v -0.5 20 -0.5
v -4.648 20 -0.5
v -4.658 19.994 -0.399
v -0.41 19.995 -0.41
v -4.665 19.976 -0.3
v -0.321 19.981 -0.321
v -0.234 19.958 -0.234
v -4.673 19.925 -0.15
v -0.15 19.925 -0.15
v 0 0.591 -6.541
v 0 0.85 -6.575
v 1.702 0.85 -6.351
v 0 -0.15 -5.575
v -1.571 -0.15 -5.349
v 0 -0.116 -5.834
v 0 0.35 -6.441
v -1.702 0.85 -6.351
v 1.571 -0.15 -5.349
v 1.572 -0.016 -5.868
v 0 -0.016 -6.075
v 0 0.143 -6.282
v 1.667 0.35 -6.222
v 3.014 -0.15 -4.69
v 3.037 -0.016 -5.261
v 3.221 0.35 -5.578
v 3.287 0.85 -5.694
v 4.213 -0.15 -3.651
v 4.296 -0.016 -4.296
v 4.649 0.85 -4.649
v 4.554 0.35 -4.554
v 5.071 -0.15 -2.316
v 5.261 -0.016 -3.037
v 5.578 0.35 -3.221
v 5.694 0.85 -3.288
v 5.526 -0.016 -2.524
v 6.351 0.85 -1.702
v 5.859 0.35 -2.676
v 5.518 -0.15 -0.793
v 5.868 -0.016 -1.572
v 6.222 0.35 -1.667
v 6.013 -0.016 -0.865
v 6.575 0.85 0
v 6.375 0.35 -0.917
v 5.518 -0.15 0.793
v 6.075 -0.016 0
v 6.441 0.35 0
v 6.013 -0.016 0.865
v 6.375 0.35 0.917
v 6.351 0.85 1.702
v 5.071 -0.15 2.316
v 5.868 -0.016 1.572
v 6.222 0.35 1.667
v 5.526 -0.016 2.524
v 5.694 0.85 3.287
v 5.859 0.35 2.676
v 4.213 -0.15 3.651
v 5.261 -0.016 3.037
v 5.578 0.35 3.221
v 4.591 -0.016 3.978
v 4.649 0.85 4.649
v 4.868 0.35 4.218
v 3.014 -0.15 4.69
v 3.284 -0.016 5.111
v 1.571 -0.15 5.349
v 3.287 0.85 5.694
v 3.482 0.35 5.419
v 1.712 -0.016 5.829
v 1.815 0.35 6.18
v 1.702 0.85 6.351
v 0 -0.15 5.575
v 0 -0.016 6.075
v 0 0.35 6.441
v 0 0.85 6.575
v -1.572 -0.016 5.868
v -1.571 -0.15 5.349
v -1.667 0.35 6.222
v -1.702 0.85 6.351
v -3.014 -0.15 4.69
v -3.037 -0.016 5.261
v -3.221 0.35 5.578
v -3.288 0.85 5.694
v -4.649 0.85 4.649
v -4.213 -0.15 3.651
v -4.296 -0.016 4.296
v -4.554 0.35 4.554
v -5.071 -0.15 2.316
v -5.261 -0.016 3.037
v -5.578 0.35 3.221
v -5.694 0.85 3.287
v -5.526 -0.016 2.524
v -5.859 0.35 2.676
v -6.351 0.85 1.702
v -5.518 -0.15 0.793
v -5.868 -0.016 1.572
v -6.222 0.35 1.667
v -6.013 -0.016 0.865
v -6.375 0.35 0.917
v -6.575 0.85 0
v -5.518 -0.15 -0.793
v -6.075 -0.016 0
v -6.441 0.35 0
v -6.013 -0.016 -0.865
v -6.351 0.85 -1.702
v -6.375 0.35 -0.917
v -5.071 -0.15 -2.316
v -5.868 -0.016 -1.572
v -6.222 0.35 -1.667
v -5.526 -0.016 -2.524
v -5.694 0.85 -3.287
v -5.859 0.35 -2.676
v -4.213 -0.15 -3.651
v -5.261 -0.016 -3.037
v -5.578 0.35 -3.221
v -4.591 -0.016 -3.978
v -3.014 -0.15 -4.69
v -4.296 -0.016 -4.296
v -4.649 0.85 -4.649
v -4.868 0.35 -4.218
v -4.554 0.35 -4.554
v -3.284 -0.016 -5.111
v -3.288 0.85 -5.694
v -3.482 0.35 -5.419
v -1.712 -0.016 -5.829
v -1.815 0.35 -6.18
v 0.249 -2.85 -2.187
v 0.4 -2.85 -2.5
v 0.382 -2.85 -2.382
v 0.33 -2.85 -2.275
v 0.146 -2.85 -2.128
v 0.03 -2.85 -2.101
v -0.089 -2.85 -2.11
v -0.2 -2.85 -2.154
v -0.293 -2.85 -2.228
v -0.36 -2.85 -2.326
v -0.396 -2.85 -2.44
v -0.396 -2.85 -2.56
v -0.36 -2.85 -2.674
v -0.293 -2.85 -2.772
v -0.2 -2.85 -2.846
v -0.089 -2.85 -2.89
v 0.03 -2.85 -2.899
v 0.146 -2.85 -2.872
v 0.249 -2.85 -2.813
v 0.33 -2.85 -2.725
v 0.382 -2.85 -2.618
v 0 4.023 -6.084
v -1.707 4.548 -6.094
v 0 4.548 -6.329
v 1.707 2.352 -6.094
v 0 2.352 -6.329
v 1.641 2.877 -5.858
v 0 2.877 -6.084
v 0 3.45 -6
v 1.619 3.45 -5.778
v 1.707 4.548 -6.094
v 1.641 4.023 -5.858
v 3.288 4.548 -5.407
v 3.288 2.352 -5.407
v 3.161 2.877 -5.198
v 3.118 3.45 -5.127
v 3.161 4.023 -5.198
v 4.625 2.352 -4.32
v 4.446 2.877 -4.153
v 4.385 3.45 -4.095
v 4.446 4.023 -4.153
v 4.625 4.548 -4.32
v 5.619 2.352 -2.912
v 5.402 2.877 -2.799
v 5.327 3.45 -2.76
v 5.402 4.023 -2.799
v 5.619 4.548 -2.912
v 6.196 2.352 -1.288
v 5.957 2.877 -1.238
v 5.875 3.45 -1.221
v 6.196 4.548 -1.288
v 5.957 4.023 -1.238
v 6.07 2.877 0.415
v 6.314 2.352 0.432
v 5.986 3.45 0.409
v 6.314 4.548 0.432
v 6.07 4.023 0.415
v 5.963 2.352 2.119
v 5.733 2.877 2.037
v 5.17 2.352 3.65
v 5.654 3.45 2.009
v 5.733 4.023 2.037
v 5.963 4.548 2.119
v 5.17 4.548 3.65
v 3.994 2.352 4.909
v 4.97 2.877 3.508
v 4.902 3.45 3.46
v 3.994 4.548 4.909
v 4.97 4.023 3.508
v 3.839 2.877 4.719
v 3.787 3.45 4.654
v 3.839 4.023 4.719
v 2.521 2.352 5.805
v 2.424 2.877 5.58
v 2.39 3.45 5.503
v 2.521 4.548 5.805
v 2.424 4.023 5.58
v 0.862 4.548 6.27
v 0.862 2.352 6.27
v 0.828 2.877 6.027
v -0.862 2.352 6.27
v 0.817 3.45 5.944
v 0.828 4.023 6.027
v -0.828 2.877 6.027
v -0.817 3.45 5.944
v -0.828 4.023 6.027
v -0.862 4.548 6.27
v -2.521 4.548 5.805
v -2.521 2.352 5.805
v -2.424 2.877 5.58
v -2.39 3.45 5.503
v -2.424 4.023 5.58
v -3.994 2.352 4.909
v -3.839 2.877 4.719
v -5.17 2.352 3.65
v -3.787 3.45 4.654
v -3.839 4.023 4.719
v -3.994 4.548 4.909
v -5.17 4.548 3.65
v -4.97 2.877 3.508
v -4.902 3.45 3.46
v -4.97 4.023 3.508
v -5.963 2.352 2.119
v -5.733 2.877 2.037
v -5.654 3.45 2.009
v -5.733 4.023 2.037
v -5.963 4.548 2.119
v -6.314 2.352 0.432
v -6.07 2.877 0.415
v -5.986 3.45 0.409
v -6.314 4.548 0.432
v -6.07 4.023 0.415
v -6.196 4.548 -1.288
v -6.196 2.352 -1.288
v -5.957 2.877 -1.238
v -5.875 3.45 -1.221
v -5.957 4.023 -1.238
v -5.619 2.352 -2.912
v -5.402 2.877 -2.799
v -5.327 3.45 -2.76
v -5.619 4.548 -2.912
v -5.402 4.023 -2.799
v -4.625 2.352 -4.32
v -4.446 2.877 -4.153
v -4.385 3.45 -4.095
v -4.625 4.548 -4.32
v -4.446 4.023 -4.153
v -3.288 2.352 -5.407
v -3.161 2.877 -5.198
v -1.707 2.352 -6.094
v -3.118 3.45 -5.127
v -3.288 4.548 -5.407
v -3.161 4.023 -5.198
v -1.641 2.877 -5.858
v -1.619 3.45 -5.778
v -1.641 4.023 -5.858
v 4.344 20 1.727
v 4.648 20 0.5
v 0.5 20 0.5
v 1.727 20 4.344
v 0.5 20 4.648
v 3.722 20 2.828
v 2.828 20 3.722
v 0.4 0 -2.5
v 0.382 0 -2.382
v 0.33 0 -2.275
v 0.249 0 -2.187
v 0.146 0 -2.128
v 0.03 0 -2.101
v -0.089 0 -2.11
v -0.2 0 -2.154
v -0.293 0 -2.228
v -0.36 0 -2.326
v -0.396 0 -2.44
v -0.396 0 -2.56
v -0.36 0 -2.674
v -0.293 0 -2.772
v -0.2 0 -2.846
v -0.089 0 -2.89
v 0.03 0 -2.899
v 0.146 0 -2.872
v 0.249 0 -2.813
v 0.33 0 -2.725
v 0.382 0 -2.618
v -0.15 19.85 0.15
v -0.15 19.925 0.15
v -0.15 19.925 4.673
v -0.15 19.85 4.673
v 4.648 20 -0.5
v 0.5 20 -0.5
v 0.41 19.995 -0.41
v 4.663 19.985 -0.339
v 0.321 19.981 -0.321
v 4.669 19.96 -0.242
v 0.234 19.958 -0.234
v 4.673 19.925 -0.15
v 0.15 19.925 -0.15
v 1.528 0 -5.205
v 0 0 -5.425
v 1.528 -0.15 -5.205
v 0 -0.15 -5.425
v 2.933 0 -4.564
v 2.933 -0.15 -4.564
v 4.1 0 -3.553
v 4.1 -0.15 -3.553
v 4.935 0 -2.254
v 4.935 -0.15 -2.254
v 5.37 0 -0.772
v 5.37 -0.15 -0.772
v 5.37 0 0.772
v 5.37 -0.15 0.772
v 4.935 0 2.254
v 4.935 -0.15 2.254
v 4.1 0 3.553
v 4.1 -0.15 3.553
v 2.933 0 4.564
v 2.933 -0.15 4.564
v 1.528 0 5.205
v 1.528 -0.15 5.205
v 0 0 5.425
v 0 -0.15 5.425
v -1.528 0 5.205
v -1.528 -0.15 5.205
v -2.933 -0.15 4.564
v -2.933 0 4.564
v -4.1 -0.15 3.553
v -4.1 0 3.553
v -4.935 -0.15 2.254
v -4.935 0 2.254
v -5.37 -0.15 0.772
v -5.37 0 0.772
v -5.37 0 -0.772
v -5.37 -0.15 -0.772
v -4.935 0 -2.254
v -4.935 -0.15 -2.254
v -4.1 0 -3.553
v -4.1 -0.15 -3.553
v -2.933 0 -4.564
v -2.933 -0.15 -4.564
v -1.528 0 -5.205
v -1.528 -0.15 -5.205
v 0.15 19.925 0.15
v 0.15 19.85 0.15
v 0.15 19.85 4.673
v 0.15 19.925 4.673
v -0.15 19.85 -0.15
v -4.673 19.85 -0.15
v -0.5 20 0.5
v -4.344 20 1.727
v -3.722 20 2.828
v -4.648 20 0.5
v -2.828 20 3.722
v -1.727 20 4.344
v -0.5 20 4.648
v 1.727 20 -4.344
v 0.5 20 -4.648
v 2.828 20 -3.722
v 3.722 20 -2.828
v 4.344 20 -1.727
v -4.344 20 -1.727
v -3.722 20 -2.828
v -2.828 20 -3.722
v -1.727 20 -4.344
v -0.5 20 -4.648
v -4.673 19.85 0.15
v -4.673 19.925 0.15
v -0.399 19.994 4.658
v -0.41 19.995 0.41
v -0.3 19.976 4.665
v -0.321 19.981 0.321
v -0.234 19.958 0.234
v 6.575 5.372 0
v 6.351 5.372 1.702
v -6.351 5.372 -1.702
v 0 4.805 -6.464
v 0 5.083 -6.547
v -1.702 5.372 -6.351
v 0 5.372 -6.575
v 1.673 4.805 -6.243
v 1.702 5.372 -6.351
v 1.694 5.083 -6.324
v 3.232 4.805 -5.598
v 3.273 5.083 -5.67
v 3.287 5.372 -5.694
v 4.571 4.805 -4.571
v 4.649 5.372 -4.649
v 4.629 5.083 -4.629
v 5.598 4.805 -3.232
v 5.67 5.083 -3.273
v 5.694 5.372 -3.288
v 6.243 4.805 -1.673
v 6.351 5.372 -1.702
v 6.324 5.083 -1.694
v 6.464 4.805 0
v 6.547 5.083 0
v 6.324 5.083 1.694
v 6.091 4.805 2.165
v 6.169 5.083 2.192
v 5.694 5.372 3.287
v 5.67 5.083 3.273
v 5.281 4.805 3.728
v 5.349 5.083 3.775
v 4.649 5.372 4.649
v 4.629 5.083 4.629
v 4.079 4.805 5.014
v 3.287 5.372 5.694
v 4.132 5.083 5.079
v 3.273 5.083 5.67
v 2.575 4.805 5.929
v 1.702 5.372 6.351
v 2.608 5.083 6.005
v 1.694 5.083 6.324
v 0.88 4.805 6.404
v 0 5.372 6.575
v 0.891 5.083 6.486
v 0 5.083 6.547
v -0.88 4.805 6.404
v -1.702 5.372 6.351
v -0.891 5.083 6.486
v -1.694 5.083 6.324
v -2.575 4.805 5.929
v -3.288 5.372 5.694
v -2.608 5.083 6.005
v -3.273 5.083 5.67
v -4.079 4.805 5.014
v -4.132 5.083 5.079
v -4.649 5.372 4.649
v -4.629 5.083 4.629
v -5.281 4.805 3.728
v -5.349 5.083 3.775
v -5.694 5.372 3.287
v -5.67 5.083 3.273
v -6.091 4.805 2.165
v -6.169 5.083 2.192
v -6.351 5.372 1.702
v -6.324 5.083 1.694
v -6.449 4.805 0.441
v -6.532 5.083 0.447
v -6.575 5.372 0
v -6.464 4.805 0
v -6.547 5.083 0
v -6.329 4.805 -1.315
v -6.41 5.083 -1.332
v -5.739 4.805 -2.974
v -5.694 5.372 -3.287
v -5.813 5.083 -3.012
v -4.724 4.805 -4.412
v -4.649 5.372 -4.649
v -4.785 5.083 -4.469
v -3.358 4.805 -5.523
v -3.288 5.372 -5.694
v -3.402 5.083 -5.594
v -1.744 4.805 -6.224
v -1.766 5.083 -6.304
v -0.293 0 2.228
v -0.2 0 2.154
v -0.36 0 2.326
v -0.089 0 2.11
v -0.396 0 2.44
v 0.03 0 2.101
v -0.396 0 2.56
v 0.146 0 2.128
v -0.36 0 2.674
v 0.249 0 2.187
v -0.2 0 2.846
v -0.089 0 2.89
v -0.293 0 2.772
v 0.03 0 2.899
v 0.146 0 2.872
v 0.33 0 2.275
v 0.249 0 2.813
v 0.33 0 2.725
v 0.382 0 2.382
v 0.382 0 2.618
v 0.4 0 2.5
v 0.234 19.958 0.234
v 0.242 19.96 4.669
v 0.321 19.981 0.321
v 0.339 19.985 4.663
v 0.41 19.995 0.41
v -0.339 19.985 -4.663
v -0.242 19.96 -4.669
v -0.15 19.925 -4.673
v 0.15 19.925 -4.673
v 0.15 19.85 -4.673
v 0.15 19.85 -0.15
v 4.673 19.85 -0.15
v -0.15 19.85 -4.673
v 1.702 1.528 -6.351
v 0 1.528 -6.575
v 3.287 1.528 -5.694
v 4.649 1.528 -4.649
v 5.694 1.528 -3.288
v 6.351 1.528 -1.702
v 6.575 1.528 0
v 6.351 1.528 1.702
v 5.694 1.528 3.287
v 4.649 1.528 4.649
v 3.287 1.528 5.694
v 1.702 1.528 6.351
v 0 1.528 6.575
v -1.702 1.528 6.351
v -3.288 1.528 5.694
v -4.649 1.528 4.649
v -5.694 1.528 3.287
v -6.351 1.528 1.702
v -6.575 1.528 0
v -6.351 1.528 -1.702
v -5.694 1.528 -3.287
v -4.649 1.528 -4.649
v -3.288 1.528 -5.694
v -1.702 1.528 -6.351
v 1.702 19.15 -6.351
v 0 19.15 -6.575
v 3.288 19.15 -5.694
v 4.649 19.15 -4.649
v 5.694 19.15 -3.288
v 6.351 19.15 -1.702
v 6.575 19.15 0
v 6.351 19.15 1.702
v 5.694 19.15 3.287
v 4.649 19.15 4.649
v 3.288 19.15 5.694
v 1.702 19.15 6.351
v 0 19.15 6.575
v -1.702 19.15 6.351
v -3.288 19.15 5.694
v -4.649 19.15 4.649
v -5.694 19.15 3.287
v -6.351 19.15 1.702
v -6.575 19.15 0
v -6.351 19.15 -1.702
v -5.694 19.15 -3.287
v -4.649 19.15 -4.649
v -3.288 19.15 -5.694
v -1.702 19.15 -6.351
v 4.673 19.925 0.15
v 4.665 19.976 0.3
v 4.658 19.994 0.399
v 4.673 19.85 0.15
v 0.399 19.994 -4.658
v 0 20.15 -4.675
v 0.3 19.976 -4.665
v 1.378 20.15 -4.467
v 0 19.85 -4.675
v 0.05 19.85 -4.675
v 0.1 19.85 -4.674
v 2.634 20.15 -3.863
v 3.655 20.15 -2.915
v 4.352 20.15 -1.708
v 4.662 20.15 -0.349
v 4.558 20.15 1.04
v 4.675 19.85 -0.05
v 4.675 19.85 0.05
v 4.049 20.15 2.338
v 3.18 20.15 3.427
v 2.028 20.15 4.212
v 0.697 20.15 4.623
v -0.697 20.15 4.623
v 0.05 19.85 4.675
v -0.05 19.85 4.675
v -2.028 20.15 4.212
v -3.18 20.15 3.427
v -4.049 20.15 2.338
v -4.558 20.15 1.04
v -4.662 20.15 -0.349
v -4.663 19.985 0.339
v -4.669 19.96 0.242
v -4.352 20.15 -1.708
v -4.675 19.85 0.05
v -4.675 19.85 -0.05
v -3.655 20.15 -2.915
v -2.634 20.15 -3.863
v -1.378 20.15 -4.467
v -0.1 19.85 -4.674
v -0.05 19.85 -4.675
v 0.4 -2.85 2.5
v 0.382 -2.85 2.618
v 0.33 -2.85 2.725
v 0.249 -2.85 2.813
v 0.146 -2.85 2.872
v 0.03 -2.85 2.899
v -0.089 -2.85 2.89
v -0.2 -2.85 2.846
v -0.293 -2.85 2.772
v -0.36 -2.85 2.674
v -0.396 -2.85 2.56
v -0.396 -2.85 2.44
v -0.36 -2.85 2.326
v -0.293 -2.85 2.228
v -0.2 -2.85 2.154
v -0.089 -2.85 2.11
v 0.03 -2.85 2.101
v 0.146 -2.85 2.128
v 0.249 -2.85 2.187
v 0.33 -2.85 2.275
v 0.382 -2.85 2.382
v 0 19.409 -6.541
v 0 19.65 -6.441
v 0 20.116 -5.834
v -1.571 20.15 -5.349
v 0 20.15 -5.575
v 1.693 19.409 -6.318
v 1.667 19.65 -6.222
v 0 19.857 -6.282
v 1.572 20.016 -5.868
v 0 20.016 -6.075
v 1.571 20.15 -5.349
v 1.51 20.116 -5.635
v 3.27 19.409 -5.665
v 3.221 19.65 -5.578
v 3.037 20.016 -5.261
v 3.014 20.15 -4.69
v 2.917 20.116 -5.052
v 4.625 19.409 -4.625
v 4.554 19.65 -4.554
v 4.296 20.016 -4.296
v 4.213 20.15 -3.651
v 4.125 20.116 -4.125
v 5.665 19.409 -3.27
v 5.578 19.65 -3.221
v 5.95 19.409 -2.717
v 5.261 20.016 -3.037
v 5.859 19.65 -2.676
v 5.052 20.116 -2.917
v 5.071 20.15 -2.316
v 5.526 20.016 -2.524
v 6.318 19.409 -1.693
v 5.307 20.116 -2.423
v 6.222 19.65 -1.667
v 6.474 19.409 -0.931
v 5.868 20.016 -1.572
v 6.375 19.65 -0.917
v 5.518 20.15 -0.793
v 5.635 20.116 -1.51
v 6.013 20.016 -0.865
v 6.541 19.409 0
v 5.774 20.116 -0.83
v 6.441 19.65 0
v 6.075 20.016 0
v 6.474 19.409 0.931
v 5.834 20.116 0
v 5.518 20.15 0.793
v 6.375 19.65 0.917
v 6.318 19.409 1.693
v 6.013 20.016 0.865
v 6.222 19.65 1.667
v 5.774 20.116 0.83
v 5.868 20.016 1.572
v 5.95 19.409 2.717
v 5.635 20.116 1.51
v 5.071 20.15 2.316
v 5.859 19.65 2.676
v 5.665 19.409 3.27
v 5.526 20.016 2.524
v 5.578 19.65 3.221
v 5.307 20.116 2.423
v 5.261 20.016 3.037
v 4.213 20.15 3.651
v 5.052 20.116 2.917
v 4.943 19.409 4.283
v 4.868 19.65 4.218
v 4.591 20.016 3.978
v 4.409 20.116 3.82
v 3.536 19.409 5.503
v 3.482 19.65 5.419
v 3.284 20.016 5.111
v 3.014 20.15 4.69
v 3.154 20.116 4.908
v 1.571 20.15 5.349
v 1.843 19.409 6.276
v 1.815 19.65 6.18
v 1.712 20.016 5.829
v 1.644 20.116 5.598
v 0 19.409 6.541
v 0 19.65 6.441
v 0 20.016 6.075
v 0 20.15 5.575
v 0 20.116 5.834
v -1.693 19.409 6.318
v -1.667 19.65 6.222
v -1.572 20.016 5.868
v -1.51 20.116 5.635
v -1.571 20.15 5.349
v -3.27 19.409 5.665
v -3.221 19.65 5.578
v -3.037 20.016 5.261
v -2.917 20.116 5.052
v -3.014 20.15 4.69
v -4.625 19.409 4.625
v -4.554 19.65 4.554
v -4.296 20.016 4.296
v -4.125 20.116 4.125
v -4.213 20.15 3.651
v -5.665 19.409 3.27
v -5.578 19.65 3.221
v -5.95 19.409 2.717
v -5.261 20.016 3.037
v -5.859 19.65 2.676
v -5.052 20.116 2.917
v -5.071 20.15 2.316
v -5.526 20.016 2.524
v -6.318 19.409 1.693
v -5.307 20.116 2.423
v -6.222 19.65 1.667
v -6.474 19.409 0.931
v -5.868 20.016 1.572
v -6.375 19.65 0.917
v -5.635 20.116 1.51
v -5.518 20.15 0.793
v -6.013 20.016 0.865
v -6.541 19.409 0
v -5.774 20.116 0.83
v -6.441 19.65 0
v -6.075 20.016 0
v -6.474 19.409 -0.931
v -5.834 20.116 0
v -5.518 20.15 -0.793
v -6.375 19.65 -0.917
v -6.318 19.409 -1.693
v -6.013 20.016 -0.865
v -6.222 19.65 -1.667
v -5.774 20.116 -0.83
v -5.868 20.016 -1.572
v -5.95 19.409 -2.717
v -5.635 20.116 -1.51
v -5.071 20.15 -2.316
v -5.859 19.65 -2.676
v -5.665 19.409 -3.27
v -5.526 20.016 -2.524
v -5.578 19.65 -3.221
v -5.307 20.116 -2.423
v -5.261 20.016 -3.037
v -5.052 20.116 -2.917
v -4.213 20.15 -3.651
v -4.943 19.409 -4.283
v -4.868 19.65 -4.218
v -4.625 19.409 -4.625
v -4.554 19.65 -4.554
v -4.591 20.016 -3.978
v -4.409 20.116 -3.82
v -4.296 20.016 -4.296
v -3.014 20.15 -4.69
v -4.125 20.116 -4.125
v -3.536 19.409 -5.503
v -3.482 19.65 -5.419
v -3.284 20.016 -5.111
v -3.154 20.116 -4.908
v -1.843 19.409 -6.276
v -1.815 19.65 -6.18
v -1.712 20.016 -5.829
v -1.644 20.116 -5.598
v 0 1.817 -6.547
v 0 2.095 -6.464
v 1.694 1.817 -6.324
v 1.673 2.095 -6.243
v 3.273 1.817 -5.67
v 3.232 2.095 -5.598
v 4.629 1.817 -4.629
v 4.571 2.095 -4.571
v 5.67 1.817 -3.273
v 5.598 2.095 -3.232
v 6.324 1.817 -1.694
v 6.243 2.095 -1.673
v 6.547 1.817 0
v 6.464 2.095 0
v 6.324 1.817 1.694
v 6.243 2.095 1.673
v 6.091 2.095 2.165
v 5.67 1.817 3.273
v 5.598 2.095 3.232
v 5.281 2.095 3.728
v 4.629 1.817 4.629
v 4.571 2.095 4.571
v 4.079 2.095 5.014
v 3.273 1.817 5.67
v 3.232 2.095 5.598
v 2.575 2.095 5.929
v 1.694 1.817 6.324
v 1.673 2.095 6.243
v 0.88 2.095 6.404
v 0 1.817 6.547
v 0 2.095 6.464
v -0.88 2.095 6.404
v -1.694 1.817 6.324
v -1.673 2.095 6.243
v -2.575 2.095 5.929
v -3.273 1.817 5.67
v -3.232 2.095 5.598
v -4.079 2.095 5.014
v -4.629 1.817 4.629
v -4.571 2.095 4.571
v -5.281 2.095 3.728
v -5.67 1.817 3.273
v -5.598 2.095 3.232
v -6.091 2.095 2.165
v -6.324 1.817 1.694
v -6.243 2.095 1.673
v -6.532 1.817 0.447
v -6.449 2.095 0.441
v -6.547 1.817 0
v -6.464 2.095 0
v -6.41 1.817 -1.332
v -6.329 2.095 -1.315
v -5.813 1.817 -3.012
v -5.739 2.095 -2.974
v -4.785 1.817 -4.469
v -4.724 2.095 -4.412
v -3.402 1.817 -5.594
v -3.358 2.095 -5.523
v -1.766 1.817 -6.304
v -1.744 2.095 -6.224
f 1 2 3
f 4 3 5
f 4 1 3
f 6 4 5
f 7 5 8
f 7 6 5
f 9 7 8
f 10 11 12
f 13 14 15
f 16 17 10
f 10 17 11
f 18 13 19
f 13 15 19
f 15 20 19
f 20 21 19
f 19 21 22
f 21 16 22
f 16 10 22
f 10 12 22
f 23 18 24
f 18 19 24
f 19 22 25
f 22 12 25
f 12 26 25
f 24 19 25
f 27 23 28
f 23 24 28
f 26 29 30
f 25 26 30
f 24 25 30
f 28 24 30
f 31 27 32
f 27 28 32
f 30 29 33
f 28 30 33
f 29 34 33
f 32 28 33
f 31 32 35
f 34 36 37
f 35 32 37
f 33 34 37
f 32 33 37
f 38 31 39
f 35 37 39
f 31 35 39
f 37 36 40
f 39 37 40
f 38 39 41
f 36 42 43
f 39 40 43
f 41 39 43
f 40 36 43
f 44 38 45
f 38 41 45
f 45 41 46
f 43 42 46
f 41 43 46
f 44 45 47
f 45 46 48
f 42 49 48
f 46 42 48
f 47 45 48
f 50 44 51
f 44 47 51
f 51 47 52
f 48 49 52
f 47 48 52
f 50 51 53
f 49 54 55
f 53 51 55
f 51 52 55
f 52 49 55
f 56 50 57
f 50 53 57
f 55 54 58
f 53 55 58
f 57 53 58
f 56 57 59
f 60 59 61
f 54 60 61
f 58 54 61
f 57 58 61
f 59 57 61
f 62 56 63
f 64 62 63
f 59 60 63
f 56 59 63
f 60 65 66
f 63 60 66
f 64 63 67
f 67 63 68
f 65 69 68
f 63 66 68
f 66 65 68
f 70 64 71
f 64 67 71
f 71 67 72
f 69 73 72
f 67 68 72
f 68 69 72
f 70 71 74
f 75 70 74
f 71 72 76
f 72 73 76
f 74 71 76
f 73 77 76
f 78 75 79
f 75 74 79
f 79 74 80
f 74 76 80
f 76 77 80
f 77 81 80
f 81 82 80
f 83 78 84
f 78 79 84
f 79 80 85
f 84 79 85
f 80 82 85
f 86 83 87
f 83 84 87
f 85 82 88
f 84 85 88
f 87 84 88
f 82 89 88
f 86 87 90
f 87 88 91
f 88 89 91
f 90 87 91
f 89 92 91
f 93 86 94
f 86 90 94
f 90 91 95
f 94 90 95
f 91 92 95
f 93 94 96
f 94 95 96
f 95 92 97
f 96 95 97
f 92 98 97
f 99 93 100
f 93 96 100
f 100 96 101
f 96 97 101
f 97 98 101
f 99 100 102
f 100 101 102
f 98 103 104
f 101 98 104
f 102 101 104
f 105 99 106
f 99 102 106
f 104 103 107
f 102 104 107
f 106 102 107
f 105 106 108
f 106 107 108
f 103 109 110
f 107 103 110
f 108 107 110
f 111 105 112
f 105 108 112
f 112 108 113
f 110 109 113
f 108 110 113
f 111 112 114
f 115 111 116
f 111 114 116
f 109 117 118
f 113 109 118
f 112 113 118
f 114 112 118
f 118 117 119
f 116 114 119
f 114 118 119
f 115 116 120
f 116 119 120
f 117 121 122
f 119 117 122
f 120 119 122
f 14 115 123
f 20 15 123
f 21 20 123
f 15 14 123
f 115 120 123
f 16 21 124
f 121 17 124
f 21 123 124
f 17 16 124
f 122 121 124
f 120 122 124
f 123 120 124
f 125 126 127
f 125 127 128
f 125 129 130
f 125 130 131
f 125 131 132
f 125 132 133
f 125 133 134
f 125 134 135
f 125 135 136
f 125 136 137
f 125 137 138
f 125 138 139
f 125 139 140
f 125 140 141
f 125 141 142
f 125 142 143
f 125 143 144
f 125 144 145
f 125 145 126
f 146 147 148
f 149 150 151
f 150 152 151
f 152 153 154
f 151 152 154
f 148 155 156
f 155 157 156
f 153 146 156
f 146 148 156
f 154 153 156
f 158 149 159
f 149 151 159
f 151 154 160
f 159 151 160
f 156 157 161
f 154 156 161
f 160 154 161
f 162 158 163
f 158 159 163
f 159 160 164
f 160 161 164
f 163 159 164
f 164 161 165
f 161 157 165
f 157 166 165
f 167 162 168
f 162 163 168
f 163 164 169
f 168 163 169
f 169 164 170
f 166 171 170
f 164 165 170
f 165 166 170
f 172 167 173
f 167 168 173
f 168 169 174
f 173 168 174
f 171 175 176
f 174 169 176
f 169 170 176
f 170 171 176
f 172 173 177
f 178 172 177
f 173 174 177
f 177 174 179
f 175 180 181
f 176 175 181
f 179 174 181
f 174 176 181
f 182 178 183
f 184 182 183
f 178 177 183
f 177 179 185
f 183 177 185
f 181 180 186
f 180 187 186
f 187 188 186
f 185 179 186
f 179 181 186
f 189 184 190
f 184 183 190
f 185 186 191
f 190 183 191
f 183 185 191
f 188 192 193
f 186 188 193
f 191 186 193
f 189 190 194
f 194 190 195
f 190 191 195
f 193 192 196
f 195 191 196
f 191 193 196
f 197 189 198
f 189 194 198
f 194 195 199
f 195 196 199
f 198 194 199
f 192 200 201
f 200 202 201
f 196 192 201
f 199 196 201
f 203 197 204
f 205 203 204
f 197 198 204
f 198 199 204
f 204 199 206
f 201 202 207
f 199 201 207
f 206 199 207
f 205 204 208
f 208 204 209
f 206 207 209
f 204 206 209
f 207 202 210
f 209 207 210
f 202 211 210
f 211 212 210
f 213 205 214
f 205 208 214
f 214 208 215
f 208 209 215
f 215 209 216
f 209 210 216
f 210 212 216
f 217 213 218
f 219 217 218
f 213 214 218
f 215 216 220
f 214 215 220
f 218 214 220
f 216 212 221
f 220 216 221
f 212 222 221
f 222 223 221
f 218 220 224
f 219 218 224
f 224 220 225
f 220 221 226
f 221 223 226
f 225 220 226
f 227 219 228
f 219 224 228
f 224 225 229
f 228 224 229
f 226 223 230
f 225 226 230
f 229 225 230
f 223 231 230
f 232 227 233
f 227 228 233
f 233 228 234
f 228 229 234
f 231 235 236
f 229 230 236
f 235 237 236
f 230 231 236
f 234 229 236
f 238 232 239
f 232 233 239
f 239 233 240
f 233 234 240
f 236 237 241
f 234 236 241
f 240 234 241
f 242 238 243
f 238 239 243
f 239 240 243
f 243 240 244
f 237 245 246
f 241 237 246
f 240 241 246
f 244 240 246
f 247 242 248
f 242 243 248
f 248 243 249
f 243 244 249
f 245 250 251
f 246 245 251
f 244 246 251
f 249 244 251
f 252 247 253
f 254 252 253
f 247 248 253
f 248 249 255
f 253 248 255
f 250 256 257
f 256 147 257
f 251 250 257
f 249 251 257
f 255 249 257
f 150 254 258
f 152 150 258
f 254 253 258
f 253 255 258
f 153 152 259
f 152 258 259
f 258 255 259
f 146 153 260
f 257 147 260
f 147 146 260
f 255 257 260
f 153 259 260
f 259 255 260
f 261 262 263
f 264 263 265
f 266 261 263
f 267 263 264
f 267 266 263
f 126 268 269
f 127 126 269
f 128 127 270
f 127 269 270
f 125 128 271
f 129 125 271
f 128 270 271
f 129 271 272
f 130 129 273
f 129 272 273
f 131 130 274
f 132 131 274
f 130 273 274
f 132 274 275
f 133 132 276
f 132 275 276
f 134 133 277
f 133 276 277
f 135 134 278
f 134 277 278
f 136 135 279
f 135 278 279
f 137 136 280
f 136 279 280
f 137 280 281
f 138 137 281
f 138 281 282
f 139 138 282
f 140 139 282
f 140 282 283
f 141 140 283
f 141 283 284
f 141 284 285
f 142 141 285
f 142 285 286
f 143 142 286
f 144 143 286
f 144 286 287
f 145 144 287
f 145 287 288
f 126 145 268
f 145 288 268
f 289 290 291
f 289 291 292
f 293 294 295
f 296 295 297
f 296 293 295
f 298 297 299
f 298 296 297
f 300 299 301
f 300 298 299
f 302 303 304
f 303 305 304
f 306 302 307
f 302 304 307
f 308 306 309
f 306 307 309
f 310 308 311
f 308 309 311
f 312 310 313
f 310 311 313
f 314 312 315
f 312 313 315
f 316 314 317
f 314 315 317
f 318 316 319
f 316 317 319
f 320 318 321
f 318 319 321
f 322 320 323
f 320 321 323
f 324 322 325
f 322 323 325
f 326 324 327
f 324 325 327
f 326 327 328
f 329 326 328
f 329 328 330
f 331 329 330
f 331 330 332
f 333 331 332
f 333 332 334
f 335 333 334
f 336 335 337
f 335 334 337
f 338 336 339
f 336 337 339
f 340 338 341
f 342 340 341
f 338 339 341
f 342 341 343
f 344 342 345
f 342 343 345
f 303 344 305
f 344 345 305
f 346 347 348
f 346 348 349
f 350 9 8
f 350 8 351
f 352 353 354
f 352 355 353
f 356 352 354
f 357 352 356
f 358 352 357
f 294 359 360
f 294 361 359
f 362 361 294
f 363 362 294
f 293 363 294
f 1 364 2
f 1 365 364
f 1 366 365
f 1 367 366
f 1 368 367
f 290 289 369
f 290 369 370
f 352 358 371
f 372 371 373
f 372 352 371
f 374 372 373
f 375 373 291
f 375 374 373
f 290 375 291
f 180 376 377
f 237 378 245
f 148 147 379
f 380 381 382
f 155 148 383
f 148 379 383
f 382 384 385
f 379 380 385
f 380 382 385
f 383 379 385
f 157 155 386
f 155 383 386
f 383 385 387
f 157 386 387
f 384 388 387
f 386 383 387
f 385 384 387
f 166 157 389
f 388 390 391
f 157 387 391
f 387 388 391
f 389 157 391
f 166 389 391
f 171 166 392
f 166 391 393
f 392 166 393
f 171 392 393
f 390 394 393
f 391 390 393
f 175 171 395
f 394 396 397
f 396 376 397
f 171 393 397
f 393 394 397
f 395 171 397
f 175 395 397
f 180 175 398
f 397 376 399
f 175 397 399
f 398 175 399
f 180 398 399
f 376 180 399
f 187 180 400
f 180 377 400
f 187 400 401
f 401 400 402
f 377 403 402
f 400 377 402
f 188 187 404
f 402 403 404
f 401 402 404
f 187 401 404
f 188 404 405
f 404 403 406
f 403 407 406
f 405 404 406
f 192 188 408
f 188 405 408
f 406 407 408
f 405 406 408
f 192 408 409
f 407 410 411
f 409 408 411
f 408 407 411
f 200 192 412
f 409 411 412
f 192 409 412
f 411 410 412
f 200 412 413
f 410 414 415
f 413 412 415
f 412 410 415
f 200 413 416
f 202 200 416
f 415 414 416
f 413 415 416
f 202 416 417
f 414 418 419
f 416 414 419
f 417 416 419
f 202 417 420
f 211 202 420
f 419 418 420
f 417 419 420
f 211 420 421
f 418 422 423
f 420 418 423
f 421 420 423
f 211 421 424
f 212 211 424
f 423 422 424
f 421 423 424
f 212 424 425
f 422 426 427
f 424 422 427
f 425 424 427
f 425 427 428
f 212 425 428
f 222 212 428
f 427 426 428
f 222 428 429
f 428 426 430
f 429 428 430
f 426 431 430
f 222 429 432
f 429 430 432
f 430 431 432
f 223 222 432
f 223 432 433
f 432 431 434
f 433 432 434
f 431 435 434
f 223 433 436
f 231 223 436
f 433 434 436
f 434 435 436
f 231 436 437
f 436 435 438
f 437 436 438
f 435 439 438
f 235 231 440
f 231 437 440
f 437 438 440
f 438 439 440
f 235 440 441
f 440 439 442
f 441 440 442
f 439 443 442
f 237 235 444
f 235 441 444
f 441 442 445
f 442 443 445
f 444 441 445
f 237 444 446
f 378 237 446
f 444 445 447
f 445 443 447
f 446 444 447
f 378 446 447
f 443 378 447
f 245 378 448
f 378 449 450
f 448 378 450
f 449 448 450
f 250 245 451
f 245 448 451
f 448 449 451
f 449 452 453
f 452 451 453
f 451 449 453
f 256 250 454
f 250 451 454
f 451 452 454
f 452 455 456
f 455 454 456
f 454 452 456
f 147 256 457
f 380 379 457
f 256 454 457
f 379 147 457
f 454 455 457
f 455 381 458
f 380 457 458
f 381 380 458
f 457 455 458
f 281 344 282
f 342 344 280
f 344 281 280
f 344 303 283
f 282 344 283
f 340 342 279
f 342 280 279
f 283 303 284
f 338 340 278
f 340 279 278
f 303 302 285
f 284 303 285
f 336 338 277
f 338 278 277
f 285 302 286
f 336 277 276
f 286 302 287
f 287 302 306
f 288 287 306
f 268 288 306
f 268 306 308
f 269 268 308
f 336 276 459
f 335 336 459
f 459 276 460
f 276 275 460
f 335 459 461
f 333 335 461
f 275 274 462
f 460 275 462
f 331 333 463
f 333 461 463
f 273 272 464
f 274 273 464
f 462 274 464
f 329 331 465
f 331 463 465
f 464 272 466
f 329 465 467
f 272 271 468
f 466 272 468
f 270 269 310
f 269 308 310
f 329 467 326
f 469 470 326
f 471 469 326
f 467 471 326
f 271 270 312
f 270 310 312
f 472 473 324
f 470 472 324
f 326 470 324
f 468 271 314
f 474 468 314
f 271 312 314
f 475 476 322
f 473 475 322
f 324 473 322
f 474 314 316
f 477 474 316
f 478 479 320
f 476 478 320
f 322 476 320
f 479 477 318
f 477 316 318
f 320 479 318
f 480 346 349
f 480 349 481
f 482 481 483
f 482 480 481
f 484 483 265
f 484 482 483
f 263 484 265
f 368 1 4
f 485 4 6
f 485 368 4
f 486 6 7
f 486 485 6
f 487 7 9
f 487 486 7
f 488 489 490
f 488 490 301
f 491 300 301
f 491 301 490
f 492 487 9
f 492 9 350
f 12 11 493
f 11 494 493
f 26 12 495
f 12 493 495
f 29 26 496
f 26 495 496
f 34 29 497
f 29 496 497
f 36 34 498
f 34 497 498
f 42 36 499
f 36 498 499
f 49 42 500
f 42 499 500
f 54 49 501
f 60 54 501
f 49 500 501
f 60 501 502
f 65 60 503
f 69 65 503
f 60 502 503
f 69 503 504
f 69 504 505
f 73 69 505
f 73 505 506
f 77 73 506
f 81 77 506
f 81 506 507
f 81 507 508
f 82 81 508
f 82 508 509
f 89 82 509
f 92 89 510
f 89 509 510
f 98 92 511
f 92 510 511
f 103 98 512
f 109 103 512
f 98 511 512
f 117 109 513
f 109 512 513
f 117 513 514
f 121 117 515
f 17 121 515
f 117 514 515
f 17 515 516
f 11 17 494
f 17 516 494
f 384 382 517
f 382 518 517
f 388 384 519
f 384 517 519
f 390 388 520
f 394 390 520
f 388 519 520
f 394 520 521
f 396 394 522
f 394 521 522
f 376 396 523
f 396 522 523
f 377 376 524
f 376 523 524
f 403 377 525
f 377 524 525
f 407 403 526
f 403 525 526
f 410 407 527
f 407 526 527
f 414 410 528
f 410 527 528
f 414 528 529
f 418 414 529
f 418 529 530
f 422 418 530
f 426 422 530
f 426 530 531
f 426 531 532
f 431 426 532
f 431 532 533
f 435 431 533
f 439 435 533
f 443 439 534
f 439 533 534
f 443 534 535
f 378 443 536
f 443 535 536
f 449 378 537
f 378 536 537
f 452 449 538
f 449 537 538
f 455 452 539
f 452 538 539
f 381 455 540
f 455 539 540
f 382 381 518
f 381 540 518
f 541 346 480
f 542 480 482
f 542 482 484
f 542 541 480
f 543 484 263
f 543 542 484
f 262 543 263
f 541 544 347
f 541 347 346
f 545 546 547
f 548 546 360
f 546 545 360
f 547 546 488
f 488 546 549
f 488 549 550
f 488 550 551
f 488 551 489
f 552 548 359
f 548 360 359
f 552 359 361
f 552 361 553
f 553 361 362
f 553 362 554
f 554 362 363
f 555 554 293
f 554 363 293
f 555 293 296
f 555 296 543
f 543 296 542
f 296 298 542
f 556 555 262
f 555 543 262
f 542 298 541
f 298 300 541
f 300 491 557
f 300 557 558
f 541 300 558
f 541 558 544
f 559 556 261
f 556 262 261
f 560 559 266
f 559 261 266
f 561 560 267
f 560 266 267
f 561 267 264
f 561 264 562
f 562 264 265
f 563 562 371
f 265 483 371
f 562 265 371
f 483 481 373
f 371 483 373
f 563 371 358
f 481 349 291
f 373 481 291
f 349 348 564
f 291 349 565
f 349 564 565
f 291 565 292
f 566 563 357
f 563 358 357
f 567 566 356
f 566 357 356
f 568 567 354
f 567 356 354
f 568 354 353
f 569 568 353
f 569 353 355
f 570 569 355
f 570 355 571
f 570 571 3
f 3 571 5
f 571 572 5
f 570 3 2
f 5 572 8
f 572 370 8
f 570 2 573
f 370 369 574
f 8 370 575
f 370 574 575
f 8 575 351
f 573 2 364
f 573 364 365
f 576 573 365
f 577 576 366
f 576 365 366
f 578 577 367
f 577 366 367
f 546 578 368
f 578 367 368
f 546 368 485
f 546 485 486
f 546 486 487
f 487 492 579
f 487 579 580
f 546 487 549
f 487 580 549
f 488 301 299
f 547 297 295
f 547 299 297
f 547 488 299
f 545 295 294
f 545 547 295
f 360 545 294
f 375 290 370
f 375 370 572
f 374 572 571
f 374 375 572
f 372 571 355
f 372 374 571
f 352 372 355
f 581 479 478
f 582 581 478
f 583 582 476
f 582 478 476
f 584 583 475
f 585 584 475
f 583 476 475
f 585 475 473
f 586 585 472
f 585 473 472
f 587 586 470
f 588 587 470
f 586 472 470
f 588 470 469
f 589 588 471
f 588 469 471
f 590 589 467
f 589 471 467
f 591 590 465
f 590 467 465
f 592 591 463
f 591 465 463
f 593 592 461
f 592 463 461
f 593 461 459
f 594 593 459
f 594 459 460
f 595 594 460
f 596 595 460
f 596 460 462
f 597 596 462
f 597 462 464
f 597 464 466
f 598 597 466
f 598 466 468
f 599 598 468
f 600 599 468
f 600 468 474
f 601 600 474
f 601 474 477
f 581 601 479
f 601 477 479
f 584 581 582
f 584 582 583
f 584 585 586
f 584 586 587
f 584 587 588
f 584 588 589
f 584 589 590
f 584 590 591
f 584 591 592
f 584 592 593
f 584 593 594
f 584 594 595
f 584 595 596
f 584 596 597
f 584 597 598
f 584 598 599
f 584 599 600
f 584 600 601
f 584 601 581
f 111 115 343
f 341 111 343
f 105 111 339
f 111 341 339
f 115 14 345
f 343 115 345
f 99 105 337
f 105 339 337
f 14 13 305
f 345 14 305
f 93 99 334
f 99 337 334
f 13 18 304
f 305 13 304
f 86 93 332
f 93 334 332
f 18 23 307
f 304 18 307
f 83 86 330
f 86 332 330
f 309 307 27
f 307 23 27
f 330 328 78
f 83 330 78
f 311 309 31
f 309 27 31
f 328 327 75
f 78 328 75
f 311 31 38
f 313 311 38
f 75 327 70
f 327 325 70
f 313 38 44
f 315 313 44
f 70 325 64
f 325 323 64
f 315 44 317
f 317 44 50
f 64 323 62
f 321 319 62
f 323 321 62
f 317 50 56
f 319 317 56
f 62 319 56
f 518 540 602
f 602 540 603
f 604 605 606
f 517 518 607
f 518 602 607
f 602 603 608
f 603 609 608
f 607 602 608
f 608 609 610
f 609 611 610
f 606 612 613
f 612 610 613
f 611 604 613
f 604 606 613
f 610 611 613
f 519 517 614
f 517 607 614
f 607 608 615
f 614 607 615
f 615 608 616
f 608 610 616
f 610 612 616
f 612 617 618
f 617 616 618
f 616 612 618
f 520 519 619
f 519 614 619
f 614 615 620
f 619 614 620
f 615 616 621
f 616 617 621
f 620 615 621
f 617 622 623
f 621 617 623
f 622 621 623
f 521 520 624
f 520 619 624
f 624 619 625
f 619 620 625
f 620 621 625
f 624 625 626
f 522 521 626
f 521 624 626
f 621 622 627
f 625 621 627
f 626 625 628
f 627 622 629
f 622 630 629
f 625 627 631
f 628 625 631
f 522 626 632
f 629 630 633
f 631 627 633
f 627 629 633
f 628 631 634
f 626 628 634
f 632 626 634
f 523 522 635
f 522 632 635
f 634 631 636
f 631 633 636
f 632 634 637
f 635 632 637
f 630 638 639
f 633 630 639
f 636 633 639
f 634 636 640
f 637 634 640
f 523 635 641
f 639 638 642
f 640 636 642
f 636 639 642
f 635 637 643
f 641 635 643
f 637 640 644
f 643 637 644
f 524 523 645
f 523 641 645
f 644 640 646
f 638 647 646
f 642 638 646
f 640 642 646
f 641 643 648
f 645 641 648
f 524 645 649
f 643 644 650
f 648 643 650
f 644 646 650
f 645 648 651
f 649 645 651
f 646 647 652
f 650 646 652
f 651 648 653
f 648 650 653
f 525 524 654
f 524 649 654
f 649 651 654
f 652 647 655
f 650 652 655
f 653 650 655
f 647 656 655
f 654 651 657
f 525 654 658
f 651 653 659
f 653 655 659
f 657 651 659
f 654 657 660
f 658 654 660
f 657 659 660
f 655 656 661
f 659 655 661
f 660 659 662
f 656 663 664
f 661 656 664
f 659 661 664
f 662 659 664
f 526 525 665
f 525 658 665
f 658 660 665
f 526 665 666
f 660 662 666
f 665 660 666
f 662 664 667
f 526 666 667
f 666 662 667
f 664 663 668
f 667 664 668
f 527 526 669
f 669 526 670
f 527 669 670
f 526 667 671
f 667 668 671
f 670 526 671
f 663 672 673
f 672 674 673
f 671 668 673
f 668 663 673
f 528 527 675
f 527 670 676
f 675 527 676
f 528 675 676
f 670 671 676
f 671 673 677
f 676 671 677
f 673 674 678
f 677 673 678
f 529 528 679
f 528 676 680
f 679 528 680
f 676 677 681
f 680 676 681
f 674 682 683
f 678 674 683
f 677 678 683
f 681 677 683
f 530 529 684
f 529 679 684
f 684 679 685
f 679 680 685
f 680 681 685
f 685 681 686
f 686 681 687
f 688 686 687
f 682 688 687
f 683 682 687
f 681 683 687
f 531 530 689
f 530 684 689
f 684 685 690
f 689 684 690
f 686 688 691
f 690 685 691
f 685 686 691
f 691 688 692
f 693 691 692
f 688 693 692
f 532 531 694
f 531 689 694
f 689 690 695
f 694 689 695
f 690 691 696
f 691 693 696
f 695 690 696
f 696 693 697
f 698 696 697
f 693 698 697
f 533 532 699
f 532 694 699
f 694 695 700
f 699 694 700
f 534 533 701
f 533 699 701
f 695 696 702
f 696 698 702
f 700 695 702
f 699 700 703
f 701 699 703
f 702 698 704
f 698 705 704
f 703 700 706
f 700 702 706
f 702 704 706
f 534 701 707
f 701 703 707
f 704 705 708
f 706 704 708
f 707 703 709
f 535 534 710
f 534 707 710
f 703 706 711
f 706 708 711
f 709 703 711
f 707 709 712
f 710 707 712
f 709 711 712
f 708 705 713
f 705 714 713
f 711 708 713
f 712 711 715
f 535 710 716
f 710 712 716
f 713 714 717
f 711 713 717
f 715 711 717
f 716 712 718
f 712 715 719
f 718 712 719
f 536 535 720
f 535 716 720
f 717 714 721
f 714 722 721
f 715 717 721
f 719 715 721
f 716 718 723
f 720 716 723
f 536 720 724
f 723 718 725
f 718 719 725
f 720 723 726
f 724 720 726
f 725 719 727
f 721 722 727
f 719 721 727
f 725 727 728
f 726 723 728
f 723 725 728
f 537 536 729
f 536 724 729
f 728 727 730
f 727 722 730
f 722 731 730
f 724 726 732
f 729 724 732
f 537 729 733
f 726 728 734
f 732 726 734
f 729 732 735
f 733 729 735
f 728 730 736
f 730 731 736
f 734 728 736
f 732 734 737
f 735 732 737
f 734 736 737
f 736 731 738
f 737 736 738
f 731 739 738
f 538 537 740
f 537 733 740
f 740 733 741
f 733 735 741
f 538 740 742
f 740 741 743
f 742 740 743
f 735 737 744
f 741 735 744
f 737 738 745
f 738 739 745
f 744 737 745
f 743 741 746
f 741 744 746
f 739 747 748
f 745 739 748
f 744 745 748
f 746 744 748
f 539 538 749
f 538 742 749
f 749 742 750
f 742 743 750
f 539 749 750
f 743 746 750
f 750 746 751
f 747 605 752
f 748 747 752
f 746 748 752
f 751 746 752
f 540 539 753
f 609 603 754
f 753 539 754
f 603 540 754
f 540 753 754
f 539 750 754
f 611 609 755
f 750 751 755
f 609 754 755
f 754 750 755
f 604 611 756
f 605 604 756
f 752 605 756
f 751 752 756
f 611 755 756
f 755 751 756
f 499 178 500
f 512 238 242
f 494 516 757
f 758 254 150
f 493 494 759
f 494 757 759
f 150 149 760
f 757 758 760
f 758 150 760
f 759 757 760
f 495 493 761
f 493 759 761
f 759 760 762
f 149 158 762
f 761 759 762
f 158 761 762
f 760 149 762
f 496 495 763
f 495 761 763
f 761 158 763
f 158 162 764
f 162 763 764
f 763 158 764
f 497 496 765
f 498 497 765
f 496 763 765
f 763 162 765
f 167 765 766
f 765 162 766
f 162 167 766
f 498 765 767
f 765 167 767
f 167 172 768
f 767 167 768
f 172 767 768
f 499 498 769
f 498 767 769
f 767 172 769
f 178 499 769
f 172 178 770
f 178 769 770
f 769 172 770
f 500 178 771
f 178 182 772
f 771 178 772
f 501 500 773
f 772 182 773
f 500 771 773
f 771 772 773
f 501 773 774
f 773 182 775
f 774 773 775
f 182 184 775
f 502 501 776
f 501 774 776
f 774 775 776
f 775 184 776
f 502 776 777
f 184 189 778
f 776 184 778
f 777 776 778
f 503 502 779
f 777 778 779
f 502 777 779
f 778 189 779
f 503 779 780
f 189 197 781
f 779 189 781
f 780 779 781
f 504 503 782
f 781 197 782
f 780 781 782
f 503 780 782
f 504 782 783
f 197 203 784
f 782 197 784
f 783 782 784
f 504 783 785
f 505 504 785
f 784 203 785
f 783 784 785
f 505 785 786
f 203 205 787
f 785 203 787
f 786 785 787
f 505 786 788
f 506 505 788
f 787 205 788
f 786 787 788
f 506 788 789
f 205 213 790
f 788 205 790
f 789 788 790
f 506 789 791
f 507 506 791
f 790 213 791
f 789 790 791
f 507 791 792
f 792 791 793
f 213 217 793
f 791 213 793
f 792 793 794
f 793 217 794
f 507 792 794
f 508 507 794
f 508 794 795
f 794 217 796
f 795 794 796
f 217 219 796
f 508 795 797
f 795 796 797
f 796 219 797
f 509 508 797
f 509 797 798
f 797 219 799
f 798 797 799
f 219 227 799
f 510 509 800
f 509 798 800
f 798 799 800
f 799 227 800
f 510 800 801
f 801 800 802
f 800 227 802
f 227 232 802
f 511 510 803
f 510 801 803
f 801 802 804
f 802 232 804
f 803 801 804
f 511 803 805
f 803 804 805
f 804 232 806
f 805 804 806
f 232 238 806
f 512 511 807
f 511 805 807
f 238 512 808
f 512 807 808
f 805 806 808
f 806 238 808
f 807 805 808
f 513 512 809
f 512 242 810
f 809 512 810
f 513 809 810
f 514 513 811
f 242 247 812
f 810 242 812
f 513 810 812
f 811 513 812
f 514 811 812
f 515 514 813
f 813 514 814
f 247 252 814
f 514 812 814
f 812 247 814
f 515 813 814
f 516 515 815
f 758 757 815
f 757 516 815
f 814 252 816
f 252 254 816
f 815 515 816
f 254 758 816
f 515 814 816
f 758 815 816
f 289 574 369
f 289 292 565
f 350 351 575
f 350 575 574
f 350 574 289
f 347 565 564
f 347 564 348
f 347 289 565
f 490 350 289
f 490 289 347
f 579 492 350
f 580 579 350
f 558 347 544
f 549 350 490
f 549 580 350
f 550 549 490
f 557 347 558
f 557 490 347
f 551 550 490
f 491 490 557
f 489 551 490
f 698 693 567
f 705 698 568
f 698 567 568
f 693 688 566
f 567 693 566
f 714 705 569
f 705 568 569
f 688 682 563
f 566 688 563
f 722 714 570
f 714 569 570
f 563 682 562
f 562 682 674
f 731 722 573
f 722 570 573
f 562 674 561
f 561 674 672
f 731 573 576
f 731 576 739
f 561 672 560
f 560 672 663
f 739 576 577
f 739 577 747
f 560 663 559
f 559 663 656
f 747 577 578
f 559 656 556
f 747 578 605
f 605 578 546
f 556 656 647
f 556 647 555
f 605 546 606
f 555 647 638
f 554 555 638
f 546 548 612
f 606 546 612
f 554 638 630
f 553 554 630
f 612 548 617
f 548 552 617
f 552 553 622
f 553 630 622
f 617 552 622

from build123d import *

# Parameters (mm, degrees)
SKETCH1_W           = 4.675
SKETCH1_H           = 1
CUT_EXTRUDE1_DEPTH  = 5.675
CIRPATTERN1_COUNT   = 2
CIRPATTERN1_ANGLE   = 90
SKETCH5_R           = 0.4
BOSS_EXTRUDE1_DEPTH = 2.85


with BuildPart() as part:
    # Sketch1 → Revolve1 (revolve)
    with BuildSketch(Plane(origin=(0, 0, 0), x_dir=(0, 0, -1), z_dir=(1, 0, 0))):
        with Locations((2.3375, 19.5)):
            Rectangle(SKETCH1_W, SKETCH1_H)
    revolve(axis=Axis((0, 33.37320456, 0), (0, -1, 0)))

    # Sketch2 → Cut-Extrude1 (cut, symmetric)
    with BuildSketch(Plane(origin=(0, 0, 0), x_dir=(0, 0, -1), z_dir=(1, 0, 0))):
        with BuildLine():
            Line((-0.5, 20), (0.5, 20))
            ThreePointArc((0.5, 20), (0.321027237, 19.981039562), (0.15, 19.925))
            Line((0.15, 19.925), (0.15, 19.85))
            Line((0.15, 19.85), (-0.15, 19.85))
            Line((-0.15, 19.85), (-0.15, 19.925))
            ThreePointArc((-0.15, 19.925), (-0.321027237, 19.981039562), (-0.5, 20))
        make_face()
    cut_extrude1 = extrude(amount=CUT_EXTRUDE1_DEPTH, both=True, mode=Mode.SUBTRACT)

    # CirPattern1: Cut-Extrude1 ×2 about axis
    cirpattern1_axis = Axis((0, 33.37320456, 0), (0, 1, 0))
    for i in range(1, CIRPATTERN1_COUNT):
        add(cut_extrude1.rotate(cirpattern1_axis, i * CIRPATTERN1_ANGLE / (CIRPATTERN1_COUNT - 1)), mode=Mode.SUBTRACT)

    # Sketch1<3> → Revolve2 (revolve)
    with BuildSketch(Plane(origin=(0, 0, 0), x_dir=(0, 0, -1), z_dir=(1, 0, 0))):
        with BuildLine():
            Line((4.675, 20.15), (4.675, 20))
            Line((4.675, 20), (4.675, 19))
            Line((4.675, 19), (0, 19))
            Line((0, 19), (0, 0))
            Line((0, 0), (5.425, 0))
            Line((5.425, 0), (5.425, -0.15))
            Line((5.425, -0.15), (5.575, -0.15))
            ThreePointArc((5.575, -0.15), (6.282106781, 0.142893219), (6.575, 0.85))
            Line((6.575, 0.85), (6.575, 1.527924299))
            ThreePointArc((6.575, 1.527924299), (6.512072918, 1.957832927), (6.328571429, 2.351671028))
            ThreePointArc((6.328571429, 2.351671028), (6, 3.45), (6.328571429, 4.548328972))
            ThreePointArc((6.328571429, 4.548328972), (6.512072918, 4.942167073), (6.575, 5.372075701))
            Line((6.575, 5.372075701), (6.575, 19.15))
            ThreePointArc((6.575, 19.15), (6.282106781, 19.857106781), (5.575, 20.15))
            Line((5.575, 20.15), (4.675, 20.15))
        make_face()
    revolve(axis=Axis((0, 33.37320456, 0), (0, -1, 0)))

    # Sketch5 → Boss-Extrude1 (add)
    with BuildSketch(Plane.XZ):
        with Locations((0, 2.5)):
            Circle(SKETCH5_R)
        with Locations((0, -2.5)):
            Circle(SKETCH5_R)
    extrude(amount=BOSS_EXTRUDE1_DEPTH)


solid = part.part
